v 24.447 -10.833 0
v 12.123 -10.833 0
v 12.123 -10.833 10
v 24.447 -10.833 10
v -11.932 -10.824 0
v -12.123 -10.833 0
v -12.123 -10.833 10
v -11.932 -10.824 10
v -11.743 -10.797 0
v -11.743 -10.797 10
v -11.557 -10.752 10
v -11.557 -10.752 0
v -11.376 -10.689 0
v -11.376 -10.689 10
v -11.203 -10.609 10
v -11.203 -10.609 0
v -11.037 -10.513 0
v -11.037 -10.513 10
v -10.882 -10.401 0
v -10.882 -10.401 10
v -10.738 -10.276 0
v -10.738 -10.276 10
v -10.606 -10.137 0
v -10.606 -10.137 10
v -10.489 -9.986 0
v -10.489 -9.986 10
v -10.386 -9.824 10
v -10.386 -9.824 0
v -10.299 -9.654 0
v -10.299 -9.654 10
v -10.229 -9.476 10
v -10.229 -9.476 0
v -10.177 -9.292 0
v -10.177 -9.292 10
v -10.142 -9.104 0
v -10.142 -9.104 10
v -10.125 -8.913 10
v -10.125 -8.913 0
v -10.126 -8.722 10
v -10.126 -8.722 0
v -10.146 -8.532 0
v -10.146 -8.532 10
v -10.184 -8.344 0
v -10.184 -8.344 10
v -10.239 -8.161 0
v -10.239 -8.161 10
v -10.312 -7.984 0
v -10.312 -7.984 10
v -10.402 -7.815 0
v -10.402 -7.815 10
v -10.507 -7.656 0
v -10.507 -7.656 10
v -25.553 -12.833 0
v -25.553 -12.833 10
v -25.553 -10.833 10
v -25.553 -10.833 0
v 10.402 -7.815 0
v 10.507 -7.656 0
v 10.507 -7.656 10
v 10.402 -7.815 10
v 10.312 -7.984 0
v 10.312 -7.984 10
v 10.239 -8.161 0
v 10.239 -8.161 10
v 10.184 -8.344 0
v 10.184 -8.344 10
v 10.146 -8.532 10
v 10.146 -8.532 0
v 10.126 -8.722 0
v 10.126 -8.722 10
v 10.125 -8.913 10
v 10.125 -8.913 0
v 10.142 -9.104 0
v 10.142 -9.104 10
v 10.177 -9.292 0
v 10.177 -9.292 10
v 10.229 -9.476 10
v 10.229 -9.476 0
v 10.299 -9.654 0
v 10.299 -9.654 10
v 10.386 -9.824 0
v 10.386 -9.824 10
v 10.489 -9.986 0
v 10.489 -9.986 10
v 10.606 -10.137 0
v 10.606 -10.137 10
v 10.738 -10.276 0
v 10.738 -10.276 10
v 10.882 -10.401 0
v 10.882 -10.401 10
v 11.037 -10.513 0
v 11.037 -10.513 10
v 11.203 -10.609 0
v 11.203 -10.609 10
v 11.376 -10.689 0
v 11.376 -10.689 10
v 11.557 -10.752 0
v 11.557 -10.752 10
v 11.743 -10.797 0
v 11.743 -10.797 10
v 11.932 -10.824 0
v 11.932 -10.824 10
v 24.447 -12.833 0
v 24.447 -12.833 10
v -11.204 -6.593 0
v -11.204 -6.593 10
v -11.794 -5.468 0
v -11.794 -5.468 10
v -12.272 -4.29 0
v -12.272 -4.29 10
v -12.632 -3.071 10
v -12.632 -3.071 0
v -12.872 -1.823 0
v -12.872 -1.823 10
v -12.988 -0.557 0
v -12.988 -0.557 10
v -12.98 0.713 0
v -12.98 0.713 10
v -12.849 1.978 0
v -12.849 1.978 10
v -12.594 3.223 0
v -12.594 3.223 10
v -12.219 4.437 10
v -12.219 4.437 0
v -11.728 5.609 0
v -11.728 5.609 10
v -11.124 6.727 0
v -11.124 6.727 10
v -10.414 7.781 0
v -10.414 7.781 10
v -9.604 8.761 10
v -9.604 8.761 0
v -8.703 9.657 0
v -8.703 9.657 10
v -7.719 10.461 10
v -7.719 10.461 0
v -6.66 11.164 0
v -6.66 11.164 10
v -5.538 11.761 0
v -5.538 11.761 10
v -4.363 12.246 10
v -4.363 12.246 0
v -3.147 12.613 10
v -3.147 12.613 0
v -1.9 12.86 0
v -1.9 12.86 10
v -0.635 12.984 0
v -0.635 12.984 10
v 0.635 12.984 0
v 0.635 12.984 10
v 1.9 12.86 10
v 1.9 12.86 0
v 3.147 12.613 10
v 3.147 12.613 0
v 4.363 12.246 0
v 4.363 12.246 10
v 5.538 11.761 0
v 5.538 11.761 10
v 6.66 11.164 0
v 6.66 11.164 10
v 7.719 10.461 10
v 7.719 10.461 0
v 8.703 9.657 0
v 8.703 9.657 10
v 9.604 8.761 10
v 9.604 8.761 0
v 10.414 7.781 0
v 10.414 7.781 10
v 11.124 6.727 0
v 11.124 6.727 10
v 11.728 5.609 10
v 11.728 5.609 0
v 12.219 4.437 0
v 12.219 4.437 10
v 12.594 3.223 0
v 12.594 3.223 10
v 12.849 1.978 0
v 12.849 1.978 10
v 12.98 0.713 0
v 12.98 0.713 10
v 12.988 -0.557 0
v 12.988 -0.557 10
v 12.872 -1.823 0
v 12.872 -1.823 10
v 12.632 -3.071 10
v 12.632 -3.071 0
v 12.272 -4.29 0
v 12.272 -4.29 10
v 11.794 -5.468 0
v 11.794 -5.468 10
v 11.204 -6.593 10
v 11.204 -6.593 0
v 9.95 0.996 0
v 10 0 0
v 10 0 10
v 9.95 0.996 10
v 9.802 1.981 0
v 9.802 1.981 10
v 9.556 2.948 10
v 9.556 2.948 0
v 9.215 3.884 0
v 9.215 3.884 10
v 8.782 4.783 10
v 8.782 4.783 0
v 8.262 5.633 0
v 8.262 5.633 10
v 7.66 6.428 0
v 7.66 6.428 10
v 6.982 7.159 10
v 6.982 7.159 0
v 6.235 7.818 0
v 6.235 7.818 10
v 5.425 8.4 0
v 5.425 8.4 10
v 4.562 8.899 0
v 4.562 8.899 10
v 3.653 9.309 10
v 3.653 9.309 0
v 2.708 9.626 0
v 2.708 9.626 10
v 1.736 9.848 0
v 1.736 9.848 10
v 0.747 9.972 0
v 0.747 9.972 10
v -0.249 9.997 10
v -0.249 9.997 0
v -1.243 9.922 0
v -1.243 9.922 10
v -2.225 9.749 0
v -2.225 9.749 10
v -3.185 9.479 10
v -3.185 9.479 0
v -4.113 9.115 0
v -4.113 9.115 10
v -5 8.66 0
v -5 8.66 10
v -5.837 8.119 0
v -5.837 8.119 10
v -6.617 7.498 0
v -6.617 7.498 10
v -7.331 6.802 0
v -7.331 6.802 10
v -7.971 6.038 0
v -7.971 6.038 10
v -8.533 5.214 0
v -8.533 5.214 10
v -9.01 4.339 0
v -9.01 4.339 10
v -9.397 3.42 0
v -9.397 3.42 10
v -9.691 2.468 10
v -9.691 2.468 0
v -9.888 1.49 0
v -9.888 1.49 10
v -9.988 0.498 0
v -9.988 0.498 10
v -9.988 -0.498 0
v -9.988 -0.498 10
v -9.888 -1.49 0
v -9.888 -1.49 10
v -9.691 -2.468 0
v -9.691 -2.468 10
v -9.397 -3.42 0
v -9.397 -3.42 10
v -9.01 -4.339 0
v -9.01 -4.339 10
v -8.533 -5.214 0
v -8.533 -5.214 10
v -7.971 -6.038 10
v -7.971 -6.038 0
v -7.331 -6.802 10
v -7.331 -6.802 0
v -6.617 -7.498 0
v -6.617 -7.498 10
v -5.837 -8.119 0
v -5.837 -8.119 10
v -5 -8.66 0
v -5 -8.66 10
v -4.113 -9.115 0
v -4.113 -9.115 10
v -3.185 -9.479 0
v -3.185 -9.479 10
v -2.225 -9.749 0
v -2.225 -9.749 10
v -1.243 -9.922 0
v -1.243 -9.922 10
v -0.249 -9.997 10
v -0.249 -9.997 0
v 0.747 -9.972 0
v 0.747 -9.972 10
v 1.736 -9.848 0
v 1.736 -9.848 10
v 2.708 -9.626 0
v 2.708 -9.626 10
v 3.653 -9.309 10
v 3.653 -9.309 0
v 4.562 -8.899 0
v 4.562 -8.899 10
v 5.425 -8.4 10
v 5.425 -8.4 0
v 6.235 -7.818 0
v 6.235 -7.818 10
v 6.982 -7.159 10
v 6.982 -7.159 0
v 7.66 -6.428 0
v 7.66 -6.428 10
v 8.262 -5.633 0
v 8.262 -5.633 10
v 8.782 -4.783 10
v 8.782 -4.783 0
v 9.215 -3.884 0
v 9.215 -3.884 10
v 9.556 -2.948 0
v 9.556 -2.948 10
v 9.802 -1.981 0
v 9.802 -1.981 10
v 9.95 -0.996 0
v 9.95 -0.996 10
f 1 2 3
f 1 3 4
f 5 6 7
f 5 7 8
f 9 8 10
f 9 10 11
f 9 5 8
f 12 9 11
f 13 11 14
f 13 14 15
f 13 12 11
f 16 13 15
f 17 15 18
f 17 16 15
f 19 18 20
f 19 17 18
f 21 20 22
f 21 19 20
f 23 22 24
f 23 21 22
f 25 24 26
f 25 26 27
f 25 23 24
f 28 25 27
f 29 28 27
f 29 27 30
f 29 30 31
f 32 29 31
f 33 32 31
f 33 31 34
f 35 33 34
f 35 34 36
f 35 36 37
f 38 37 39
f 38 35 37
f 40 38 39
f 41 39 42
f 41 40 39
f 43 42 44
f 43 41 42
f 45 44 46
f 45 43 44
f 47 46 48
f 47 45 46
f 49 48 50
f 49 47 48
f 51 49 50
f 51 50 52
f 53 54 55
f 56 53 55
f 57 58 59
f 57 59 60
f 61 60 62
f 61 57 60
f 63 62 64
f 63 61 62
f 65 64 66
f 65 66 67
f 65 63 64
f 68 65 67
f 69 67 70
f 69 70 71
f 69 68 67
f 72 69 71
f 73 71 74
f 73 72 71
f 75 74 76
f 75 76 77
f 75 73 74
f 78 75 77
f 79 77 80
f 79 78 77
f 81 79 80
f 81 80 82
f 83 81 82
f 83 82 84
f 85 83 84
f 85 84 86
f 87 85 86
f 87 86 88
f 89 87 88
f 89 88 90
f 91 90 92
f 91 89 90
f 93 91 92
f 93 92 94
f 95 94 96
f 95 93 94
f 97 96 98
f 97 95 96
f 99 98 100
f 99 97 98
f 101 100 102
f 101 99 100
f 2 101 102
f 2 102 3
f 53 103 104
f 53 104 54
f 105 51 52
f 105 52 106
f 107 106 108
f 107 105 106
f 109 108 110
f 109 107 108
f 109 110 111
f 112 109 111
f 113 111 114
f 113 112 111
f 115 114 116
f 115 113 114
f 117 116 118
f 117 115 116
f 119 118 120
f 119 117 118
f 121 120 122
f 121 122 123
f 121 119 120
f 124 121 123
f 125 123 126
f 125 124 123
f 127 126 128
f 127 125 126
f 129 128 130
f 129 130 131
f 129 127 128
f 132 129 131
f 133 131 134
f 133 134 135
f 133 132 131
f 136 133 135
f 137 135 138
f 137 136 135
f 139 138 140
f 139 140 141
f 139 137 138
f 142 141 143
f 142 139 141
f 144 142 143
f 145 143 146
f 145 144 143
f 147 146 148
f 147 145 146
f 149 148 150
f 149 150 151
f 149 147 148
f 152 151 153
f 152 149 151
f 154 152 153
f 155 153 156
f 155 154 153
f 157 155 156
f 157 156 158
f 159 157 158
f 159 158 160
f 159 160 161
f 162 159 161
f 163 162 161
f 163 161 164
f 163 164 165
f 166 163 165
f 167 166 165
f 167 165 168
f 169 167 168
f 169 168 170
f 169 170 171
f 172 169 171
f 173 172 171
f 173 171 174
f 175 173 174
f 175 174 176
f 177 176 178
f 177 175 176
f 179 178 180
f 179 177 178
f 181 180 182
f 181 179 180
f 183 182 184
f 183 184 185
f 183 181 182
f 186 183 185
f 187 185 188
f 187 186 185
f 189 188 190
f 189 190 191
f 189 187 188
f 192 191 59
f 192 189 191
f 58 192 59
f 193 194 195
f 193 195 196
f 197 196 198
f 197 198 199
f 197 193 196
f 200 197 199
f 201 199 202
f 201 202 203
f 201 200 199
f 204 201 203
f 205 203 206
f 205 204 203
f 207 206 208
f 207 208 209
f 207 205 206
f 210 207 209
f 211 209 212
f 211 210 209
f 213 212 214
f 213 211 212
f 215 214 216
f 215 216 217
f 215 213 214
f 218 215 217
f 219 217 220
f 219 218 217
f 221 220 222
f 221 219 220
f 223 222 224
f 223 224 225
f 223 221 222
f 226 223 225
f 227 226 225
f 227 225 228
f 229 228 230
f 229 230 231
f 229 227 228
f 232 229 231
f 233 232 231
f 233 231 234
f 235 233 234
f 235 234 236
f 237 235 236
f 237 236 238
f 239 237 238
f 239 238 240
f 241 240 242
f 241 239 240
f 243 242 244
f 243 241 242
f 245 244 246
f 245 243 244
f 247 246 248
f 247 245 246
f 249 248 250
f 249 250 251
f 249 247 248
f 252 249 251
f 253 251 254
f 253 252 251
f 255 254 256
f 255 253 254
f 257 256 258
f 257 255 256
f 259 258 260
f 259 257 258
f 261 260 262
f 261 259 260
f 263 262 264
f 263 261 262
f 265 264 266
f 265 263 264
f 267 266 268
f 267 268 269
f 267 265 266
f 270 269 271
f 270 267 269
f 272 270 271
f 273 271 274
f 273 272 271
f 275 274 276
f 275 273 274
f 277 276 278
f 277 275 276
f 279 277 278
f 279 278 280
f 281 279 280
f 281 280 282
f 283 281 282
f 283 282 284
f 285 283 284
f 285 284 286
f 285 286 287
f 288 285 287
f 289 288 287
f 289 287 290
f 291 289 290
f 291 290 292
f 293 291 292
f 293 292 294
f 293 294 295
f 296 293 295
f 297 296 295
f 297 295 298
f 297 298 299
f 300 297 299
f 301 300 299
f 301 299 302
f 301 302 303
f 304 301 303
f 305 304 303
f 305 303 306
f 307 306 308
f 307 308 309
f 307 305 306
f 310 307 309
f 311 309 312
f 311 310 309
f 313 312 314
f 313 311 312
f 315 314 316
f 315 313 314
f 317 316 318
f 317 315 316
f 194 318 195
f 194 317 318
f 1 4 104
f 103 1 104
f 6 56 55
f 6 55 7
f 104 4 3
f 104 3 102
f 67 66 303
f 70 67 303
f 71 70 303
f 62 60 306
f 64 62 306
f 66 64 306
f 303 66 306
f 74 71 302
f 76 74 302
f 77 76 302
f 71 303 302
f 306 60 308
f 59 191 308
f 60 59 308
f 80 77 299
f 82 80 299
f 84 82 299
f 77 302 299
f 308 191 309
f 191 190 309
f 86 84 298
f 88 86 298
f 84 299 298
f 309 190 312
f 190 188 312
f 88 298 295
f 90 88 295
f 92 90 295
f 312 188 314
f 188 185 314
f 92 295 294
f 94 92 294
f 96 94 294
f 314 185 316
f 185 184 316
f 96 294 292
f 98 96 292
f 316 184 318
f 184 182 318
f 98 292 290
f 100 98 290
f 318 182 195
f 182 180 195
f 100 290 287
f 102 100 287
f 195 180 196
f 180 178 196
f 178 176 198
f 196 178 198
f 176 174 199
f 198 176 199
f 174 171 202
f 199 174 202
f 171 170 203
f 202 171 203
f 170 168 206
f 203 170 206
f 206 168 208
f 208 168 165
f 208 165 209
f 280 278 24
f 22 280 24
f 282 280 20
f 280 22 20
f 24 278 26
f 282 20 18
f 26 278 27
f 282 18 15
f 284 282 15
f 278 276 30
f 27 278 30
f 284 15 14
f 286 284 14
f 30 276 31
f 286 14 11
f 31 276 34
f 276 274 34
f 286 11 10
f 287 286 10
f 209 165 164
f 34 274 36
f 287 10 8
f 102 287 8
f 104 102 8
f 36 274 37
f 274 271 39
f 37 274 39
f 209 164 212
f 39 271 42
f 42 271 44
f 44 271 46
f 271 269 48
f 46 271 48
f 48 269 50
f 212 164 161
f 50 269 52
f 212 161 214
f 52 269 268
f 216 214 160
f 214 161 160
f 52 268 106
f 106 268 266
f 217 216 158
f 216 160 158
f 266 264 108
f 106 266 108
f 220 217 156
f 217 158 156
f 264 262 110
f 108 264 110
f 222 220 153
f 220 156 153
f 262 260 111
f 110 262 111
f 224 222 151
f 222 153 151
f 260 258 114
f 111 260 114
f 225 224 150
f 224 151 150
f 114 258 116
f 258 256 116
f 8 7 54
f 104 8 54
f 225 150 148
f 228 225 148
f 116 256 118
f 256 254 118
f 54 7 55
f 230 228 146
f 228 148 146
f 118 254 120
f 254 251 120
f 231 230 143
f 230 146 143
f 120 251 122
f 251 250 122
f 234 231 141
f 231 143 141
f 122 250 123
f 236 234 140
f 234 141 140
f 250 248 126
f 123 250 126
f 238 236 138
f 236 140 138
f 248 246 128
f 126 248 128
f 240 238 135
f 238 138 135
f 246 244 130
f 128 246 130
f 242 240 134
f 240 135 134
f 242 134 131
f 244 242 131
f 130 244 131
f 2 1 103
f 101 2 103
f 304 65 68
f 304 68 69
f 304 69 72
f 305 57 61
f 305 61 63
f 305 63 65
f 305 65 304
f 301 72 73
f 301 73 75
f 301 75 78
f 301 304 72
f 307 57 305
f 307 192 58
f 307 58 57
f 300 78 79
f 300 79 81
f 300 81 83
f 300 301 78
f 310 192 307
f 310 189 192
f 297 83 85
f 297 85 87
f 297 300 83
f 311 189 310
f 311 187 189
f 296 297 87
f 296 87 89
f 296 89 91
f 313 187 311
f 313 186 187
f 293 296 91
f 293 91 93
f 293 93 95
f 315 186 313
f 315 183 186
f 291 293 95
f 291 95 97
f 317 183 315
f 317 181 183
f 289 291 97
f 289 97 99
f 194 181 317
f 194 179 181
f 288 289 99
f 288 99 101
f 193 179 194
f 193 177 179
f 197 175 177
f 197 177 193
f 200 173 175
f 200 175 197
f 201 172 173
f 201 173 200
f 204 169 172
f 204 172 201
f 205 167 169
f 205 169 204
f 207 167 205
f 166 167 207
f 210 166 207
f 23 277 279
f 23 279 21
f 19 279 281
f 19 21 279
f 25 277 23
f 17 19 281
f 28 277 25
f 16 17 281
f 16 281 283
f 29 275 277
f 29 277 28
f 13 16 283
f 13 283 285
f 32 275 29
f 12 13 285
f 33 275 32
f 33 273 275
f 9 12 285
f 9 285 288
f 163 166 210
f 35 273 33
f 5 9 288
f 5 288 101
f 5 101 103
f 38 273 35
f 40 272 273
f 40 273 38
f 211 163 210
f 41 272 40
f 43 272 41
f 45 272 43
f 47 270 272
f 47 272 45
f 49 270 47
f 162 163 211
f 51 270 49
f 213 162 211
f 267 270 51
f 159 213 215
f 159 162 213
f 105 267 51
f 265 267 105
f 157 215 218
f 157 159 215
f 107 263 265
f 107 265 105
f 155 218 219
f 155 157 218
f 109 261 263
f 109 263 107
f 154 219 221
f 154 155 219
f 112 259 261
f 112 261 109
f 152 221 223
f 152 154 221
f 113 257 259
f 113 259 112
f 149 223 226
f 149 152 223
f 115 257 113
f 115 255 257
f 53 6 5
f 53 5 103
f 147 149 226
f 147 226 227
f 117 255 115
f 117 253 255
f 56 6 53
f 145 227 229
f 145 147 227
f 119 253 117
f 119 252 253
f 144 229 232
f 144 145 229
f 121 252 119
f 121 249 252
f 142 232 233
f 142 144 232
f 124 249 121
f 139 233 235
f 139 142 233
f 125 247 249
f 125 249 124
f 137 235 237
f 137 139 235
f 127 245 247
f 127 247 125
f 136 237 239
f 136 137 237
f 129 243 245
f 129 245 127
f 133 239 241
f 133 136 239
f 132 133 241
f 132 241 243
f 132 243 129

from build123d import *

# Parameters (mm, degrees)
ESQUISSE1_R        = 10
BOSS_EXTRU_3_DEPTH = 10


with BuildPart() as part:
    # Esquisse1 → Boss.-Extru.3 (new body)
    with BuildSketch(Plane.XY):
        with BuildLine():
            Line((0, -12.833333333), (-25.552770798, -12.833333333))
            Line((-25.552770798, -12.833333333), (-25.552770798, -10.833333333))
            Line((-25.552770798, -10.833333333), (-12.123210063, -10.833333333))
            ThreePointArc((-12.123210063, -10.833333333), (-10.340577802, -9.740098034), (-10.506782054, -7.655555556))
            ThreePointArc((-10.506782054, -7.655555556), (0, 13), (10.506782054, -7.655555556))
            ThreePointArc((10.506782054, -7.655555556), (10.340577802, -9.740098034), (12.123210063, -10.833333333))
            Line((12.123210063, -10.833333333), (24.447229202, -10.833333333))
            Line((24.447229202, -10.833333333), (24.447229202, -12.833333333))
            Line((24.447229202, -12.833333333), (0, -12.833333333))
        make_face()
        Circle(ESQUISSE1_R, mode=Mode.SUBTRACT)
    extrude(amount=BOSS_EXTRU_3_DEPTH)


solid = part.part
